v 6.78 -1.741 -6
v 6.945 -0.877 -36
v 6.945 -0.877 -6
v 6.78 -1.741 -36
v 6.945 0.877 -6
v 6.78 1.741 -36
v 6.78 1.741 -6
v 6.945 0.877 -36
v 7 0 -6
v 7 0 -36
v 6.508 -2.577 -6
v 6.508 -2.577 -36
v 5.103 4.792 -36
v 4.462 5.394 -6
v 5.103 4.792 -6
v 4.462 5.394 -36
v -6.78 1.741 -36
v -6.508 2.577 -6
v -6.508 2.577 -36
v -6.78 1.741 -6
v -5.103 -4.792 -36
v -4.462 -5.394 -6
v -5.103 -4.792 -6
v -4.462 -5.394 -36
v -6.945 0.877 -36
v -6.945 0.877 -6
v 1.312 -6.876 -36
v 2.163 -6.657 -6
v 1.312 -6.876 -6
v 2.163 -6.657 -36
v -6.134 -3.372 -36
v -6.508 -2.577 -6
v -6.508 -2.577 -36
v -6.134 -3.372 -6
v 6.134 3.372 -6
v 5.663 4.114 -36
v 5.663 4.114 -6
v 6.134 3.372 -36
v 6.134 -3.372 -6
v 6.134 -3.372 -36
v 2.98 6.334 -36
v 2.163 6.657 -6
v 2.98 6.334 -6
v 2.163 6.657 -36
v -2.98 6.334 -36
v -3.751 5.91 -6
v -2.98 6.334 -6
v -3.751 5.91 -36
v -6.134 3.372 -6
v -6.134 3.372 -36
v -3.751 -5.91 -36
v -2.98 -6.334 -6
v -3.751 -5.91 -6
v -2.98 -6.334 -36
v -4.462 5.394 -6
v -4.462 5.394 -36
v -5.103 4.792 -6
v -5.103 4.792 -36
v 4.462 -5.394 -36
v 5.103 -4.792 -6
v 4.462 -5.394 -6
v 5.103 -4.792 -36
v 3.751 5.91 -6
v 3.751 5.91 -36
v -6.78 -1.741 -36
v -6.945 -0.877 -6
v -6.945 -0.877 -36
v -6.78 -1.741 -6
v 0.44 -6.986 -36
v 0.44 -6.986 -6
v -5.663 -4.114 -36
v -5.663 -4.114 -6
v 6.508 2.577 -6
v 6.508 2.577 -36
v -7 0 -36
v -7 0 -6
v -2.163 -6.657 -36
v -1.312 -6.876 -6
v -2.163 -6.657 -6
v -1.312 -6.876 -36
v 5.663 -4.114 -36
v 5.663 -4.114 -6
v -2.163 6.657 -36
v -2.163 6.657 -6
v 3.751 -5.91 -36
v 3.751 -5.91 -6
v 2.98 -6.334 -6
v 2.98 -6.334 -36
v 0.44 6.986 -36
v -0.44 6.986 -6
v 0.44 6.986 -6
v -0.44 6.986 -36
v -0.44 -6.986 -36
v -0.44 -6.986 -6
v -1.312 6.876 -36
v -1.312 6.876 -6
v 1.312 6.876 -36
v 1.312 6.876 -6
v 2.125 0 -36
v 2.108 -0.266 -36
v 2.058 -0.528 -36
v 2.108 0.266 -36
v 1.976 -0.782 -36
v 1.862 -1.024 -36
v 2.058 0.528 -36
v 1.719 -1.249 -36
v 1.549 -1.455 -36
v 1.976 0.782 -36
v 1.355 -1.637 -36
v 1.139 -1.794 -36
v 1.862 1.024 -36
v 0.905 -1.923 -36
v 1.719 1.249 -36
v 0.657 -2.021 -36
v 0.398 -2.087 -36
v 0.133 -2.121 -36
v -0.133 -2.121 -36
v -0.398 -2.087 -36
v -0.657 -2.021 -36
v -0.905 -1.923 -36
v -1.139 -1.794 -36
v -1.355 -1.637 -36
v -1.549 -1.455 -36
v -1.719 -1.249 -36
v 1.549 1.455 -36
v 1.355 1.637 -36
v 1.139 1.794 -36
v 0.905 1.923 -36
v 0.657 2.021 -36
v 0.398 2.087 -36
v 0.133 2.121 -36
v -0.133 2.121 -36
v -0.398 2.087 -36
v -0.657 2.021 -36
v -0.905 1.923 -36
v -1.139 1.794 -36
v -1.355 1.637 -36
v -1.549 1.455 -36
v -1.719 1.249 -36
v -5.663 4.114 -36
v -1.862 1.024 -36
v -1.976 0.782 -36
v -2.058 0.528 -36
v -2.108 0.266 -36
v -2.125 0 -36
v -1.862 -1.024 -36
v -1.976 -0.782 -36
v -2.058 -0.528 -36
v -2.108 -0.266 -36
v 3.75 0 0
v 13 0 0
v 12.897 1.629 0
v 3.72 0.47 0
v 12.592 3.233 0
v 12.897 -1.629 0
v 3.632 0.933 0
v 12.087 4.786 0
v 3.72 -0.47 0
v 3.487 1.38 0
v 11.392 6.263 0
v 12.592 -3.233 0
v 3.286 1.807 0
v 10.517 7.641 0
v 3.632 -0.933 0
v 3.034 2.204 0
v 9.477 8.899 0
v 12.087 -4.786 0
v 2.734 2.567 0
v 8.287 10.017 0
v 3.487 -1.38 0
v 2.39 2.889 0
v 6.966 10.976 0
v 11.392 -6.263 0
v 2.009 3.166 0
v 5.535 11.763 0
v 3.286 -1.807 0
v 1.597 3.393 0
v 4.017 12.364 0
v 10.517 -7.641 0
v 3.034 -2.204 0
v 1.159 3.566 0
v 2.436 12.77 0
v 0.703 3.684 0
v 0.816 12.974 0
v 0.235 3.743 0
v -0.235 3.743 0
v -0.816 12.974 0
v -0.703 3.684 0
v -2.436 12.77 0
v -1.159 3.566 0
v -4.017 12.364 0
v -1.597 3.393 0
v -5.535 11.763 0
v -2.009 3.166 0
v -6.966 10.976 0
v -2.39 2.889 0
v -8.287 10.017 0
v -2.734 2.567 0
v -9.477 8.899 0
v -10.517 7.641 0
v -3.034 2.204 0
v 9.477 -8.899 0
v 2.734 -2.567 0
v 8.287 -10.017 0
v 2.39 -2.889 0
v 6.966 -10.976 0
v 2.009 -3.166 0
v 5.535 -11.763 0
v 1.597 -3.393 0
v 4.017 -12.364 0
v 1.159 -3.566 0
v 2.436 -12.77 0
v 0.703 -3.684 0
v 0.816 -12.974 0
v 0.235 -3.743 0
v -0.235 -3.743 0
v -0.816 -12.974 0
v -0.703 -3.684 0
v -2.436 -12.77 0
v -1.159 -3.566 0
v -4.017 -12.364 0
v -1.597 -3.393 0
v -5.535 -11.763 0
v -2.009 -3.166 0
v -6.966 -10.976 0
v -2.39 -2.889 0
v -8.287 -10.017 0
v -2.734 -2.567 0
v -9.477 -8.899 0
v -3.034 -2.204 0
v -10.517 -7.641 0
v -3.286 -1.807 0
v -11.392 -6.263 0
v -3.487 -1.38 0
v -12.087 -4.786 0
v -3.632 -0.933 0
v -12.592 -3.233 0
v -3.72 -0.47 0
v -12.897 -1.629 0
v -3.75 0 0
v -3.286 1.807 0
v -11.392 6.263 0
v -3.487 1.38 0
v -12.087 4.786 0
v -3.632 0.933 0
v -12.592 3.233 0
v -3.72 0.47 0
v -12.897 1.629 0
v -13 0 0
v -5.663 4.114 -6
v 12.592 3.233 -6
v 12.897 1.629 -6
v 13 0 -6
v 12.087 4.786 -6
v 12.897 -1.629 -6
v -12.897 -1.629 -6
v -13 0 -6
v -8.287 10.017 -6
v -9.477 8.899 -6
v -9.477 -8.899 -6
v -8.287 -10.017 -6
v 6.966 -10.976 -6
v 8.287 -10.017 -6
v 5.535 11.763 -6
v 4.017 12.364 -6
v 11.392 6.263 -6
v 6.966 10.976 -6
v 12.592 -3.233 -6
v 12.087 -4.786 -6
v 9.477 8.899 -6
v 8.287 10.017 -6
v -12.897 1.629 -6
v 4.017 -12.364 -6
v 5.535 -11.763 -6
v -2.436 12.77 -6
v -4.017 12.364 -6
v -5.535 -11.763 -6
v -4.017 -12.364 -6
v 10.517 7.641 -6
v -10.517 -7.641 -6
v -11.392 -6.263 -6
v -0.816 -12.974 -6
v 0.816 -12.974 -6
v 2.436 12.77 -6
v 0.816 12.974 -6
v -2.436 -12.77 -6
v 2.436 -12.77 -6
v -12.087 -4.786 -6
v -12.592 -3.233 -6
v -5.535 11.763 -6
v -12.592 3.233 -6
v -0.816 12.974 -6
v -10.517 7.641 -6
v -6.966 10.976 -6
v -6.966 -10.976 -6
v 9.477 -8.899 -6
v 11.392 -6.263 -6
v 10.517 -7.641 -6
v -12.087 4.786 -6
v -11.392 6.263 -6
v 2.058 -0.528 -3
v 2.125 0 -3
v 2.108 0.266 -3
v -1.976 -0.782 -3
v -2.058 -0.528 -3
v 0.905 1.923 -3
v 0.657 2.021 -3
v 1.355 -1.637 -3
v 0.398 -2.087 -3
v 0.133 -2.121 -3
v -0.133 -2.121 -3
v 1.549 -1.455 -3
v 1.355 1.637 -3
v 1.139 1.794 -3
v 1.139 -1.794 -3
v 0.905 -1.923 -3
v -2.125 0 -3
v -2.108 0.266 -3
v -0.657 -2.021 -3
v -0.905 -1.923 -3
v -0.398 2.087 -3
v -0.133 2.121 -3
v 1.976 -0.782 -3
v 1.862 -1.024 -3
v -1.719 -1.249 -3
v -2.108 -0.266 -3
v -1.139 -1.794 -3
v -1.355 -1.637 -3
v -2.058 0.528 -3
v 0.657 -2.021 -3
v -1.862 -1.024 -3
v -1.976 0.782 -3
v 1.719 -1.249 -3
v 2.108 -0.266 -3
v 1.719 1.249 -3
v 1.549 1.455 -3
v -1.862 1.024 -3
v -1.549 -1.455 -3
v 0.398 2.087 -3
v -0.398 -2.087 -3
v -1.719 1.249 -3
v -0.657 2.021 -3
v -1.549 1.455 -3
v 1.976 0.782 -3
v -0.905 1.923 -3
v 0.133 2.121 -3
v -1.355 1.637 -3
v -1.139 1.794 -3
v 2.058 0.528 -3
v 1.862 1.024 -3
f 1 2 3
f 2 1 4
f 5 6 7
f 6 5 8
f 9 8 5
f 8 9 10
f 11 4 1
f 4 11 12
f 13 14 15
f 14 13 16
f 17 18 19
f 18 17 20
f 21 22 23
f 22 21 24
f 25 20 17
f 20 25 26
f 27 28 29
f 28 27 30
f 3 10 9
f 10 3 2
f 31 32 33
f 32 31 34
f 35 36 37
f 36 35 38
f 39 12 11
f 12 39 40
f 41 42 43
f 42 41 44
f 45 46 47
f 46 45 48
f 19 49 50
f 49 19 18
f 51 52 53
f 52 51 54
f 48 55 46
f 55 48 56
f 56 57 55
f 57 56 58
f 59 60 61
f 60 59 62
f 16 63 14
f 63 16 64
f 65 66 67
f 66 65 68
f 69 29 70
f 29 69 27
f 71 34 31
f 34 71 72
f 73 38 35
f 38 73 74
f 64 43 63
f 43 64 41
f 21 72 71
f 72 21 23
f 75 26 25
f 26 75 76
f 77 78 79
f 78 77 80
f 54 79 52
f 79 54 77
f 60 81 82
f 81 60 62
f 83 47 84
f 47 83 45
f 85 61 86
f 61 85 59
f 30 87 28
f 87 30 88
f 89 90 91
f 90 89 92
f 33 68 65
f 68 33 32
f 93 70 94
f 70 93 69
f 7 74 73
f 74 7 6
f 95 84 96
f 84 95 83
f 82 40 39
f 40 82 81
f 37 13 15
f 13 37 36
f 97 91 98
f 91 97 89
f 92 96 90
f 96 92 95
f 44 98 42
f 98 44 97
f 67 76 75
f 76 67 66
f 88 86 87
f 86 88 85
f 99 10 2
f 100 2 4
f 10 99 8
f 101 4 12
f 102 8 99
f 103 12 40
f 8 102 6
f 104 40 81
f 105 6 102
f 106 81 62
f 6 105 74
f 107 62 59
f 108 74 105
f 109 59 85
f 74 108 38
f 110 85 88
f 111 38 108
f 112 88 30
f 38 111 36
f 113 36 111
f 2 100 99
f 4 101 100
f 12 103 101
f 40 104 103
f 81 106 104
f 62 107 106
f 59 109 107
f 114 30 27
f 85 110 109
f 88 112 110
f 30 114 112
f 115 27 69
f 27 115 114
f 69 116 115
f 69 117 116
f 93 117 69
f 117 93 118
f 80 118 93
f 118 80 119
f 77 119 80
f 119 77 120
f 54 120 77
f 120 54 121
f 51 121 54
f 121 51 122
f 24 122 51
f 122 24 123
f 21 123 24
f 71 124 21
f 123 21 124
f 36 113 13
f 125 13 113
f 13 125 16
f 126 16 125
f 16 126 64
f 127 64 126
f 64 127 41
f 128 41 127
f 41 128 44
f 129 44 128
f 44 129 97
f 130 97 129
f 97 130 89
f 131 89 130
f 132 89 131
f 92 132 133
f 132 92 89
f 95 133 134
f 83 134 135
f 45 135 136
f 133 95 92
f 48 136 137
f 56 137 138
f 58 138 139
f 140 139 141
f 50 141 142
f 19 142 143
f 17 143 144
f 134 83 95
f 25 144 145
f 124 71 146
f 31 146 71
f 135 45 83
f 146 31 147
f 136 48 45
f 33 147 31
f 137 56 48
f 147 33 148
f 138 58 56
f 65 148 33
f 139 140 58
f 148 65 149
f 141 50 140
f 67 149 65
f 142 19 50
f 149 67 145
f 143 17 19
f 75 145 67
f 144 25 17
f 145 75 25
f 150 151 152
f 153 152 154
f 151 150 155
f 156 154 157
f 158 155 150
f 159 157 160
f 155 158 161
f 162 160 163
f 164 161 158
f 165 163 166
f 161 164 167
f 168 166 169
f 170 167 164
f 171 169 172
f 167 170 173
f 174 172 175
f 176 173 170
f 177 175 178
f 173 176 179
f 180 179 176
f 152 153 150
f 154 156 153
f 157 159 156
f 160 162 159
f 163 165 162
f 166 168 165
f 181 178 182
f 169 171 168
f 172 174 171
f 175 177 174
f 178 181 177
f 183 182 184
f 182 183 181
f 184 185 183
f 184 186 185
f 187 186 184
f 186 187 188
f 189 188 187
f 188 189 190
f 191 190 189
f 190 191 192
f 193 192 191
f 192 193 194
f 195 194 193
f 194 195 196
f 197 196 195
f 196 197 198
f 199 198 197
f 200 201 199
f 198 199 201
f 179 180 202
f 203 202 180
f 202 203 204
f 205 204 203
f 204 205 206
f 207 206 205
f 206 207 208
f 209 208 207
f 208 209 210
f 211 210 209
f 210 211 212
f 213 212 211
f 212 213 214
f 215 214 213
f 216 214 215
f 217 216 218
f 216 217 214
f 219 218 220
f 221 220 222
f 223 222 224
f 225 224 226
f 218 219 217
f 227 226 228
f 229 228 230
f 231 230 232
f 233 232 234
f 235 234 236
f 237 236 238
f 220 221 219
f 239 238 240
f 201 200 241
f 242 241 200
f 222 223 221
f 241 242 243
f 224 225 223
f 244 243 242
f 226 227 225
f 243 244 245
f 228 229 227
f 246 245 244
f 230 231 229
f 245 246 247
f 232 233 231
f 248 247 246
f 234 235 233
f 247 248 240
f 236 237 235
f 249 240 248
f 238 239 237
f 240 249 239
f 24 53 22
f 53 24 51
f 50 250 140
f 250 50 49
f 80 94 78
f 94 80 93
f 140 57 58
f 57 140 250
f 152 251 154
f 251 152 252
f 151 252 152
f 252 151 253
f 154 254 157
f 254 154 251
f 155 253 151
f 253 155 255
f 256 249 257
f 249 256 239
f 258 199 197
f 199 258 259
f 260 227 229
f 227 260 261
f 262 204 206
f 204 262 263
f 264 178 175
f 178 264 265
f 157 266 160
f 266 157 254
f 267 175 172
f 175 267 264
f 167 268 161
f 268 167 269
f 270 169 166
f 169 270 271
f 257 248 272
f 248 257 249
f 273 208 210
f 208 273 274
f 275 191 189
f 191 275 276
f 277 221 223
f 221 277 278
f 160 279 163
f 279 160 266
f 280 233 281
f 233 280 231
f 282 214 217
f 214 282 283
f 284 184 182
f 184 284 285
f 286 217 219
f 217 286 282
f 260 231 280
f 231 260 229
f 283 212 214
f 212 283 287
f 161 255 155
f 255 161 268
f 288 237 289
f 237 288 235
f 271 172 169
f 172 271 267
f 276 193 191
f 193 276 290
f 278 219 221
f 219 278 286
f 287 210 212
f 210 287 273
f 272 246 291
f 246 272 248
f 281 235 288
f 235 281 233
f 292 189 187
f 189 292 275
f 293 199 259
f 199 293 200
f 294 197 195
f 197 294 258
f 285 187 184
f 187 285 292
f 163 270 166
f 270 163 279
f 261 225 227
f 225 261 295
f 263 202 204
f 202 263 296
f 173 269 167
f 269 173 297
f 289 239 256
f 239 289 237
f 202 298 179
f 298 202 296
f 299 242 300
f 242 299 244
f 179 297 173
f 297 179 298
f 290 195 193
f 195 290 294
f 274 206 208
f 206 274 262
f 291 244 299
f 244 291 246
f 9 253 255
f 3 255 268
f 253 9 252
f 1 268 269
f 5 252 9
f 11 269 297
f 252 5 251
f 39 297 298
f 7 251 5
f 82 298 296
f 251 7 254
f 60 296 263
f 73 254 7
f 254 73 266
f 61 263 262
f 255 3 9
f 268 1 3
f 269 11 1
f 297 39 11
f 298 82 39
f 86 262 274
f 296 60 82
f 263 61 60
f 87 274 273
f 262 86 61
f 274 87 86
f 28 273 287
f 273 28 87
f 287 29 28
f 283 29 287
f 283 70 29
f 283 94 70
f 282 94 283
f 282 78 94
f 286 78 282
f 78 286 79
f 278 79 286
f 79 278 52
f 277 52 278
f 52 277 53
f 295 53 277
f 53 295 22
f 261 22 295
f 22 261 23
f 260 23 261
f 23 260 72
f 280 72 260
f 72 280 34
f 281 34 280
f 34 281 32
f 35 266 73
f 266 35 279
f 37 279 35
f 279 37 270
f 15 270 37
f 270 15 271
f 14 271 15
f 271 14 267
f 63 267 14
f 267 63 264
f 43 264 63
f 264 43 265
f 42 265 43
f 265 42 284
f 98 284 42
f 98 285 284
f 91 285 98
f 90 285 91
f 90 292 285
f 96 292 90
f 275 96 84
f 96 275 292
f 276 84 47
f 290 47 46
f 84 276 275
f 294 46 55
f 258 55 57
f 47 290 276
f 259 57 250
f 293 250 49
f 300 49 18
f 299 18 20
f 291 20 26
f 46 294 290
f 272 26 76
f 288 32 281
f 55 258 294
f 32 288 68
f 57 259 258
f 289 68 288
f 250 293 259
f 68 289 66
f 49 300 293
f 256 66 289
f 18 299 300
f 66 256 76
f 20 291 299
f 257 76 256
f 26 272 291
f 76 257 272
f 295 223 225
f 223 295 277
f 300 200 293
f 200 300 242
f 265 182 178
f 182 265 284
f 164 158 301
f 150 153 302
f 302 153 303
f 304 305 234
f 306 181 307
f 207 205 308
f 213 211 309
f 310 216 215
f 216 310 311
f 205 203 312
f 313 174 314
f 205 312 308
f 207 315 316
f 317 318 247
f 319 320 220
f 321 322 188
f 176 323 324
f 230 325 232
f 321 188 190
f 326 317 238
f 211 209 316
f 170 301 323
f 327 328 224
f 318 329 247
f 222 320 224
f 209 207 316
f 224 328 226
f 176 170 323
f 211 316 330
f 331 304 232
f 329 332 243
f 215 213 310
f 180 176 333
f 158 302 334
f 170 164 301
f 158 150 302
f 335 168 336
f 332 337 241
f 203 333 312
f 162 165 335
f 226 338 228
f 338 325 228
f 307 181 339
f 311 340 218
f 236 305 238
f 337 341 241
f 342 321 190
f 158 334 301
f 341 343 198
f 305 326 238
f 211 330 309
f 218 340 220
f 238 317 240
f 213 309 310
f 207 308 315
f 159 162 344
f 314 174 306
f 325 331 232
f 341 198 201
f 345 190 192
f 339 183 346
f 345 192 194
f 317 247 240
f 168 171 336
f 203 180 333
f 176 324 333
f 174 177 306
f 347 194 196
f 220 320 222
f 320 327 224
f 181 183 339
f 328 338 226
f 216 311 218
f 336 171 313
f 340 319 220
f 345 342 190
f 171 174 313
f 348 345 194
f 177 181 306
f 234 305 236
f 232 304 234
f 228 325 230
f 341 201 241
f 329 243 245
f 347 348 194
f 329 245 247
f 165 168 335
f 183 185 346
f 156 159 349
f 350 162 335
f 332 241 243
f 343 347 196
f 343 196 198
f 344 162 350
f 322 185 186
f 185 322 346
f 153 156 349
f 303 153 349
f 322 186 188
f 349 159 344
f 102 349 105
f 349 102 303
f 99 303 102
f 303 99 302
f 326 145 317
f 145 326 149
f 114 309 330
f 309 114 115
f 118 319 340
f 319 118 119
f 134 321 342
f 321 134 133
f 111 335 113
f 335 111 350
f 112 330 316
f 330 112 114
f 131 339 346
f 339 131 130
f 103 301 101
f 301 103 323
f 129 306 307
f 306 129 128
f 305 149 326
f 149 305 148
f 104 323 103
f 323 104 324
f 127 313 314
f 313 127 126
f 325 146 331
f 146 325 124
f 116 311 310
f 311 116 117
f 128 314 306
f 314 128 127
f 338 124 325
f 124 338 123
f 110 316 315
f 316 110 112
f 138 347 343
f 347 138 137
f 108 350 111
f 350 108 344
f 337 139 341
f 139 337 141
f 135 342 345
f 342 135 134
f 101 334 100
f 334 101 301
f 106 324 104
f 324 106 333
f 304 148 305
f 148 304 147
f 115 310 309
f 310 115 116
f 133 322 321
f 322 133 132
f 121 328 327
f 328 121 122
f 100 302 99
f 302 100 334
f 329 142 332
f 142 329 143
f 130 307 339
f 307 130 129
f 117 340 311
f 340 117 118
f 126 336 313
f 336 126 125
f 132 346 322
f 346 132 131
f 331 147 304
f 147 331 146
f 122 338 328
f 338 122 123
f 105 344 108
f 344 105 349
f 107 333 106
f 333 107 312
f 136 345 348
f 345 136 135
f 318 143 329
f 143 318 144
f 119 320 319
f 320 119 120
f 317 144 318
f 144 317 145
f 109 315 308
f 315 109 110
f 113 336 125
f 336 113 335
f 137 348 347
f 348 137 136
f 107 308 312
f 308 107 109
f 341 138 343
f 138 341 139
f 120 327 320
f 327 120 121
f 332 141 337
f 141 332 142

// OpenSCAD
$fn = 50;


difference() {
	union() {
		translate(v = [0, 0, -36.0000000000]) {
			cylinder(h = 36, r = 7.0000000000);
		}
		translate(v = [0, 0, -6.0000000000]) {
			cylinder(h = 6, r = 13.0000000000);
		}
	}
	union() {
		translate(v = [0, 0, 0]) {
			rotate(a = [0, 0, 0]) {
				difference() {
					union() {
						#translate(v = [0, 0, -36.0000000000]) {
							cylinder(h = 36, r = 2.0000000000);
						}
						#translate(v = [0, 0, -3]) {
							cylinder(h = 3, r1 = 2.1250000000, r2 = 3.7500000000);
						}
						#translate(v = [0, 0, -36.0000000000]) {
							cylinder(h = 36, r = 2.1250000000);
						}
						#translate(v = [0, 0, -36.0000000000]) {
							cylinder(h = 36, r = 2.0000000000);
						}
					}
					union();
				}
			}
		}
	}
}
